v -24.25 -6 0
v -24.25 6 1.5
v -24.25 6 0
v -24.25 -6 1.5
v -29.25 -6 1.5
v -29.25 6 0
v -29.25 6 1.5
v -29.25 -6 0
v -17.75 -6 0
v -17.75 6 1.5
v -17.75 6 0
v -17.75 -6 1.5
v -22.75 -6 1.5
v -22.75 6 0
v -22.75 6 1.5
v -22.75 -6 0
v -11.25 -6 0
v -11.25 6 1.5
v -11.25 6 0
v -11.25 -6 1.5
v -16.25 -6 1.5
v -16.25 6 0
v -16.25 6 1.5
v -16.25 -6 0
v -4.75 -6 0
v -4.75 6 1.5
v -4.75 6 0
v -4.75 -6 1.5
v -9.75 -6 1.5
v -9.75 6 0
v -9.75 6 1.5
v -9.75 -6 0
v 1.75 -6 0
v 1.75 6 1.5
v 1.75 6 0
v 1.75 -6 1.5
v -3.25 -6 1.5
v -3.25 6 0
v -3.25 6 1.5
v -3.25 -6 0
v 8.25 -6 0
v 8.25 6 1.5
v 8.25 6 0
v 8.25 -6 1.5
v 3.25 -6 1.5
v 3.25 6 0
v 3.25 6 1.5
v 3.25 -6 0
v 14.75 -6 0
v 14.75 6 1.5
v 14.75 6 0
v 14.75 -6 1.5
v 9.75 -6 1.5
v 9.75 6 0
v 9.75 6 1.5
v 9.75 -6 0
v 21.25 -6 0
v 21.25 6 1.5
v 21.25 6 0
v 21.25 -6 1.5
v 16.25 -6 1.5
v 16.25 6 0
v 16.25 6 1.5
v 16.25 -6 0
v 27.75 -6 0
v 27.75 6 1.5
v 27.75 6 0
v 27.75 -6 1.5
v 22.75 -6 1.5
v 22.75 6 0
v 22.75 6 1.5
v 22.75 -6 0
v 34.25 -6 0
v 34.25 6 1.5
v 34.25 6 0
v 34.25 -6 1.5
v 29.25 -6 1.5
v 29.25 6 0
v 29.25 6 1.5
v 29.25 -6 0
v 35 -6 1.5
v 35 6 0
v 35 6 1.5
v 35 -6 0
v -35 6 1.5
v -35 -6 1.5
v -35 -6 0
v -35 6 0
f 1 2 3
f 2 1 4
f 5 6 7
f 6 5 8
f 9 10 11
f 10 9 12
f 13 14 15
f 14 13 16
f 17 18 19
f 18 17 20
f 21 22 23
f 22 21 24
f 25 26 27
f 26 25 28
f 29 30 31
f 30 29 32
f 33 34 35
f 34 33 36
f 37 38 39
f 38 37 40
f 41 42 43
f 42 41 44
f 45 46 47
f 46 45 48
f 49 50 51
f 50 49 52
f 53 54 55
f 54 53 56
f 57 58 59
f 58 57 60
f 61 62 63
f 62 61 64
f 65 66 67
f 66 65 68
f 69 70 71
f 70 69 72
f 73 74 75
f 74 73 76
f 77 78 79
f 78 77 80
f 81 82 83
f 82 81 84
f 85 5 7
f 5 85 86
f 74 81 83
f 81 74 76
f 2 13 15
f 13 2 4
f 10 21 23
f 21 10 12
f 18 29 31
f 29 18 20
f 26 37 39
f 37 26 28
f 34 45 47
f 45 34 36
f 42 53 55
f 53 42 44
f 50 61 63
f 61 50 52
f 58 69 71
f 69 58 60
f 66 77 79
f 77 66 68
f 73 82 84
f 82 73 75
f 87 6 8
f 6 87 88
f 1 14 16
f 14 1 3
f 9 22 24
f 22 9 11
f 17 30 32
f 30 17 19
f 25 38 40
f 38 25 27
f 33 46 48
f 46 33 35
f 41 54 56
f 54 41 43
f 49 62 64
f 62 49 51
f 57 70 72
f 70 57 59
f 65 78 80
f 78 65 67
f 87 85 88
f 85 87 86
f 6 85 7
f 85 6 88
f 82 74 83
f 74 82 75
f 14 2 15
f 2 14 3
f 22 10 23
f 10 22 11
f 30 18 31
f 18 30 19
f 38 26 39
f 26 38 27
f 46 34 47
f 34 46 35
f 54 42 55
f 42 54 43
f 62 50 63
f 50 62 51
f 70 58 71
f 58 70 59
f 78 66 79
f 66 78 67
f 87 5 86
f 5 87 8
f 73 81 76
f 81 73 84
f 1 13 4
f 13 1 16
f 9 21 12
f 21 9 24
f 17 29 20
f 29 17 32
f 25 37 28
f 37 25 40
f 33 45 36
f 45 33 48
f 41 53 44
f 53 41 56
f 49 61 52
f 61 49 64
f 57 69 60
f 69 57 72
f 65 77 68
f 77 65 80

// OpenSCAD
// 10-well agarose gel casting comb
// Print orientation: flat on bed, teeth pointing down (-Y)

// ---------- Parameters ----------
plate_t      = 1.5;   // plate thickness (Z)
spine_l      = 70;    // spine length (X)
spine_w      = 12;    // spine width (Y)
teeth_n      = 10;    // number of teeth
teeth_w      = 5.0;   // tooth width (X)
teeth_l      = 12;    // tooth length (Y)
teeth_pitch  = teeth_w + 1.5; // centre-to-centre spacing (X)
eps          = 0.5;   // cutter overshoot

$fn = 64;

// ---------- Model ----------
difference() {
    // Plate with spine
    union() {
        translate([-spine_l/2, -spine_w/2, 0])
            cube([spine_l, spine_w, plate_t]);
    }

    // Teeth cutters, centred on spine
    for (i = [0 : teeth_n - 1])
        translate([(i - (teeth_n - 1)/2) * teeth_pitch,
                   -spine_w/2 - eps,
                   -eps])
            cube([teeth_w, teeth_l + 2*eps, plate_t + 2*eps]);
}
